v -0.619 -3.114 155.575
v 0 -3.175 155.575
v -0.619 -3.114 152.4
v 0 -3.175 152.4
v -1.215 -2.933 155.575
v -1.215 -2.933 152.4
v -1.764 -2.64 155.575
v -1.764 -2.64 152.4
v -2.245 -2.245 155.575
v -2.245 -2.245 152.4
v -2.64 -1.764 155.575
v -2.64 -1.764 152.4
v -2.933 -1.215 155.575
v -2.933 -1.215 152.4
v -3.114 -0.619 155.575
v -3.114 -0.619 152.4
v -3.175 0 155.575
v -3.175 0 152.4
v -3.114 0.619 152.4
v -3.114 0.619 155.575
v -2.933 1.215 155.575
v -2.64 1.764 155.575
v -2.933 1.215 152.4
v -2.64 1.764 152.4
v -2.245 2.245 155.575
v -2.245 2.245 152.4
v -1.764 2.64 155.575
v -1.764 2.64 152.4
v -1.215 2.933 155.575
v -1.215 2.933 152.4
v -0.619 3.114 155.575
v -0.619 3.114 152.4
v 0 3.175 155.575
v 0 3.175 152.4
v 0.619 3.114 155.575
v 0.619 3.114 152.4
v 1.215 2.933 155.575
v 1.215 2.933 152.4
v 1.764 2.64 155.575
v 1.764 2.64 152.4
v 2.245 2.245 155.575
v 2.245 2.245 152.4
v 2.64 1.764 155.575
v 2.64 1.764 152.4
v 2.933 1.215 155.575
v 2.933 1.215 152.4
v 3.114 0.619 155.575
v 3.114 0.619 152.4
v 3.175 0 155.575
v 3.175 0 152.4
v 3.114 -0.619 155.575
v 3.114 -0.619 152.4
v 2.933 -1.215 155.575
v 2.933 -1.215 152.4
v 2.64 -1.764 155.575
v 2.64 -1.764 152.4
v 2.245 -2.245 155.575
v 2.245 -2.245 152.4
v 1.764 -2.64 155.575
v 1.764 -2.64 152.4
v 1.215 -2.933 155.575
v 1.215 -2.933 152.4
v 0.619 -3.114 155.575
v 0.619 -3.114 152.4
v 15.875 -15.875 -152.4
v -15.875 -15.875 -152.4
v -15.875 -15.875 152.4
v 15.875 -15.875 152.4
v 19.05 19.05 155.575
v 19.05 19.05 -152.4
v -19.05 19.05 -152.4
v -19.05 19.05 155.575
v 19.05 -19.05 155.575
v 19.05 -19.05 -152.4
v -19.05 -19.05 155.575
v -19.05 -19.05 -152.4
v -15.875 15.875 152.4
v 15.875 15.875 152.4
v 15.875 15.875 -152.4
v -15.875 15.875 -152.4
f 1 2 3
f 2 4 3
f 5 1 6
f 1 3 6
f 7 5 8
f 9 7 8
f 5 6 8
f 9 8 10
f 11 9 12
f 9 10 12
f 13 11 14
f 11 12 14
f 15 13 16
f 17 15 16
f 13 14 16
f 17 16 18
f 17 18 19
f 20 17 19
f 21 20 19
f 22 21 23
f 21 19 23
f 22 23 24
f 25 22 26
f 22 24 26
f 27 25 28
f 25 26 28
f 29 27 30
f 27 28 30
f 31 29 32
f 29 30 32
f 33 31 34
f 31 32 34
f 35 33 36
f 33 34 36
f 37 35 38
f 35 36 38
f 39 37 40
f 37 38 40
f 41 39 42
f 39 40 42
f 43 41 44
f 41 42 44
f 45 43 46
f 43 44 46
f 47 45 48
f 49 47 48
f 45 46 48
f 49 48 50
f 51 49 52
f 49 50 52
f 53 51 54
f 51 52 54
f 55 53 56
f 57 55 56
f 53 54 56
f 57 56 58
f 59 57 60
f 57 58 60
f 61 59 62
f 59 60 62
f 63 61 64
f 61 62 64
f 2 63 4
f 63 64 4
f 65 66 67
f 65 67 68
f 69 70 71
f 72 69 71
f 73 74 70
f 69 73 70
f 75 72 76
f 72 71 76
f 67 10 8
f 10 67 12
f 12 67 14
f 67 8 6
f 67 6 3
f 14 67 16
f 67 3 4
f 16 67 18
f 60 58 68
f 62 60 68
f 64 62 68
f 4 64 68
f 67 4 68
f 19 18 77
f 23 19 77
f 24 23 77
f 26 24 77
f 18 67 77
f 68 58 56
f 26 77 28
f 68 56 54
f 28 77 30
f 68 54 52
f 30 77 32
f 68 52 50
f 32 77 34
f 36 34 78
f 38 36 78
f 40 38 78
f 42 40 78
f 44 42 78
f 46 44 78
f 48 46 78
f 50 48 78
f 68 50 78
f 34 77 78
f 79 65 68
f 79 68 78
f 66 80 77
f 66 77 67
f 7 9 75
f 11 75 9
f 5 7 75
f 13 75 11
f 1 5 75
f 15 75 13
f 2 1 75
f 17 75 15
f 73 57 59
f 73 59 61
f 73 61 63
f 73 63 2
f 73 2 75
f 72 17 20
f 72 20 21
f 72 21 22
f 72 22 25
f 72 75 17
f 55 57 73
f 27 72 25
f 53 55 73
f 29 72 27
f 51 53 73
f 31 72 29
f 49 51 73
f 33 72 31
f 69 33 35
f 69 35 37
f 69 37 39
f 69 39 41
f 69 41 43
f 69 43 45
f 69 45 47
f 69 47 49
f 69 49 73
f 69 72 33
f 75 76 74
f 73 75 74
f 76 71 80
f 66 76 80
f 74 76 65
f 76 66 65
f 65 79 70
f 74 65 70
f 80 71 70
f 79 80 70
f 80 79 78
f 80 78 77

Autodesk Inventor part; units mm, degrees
ref_plane "YZ Plane" through (0, 0, 0) normal (1, 0, 0) x (0, 1, 0)
ref_plane "XZ Plane" through (0, 0, 0) normal (0, 1, 0) x (-1, 0, 0)
ref_plane "XY Plane" through (0, 0, 0) normal (0, 0, 1) x (1, 0, 0)
sketch "Sketch1" plane through (0, 0, 0) normal (0, 0, 1) x (1, 0, 0)
  line L0 (-19.05, -19.05) -> (19.05, -19.05)
  line L1 (19.05, -19.05) -> (19.05, 19.05)
  line L2 (19.05, 19.05) -> (-19.05, 19.05)
  line L3 (-19.05, 19.05) -> (-19.05, -19.05)
  line L4 (-19.05, -19.05) -> (19.05, 19.05) construction
  line L5 (19.05, -19.05) -> (-19.05, 19.05) construction
  line L6 (-15.875, -15.875) -> (15.875, -15.875)
  line L7 (15.875, -15.875) -> (15.875, 15.875)
  line L8 (15.875, 15.875) -> (-15.875, 15.875)
  line L9 (-15.875, 15.875) -> (-15.875, -15.875)
  line L10 (-15.875, -15.875) -> (15.875, 15.875) construction
  line L11 (15.875, -15.875) -> (-15.875, 15.875) construction
  point P0 (0, 0)
  dimension "d0" = 38.1
  dimension "d1" = 3.175
extrude "Extrusion1" add sketch "Sketch1" along normal mid plane 304.8
sketch "Sketch3" plane through (0, 0, 152.4) normal (0, 0, 1) x (1, 0, 0)
  line L0 (-19.05, -19.05) -> (19.05, -19.05)
  line L1 (19.05, -19.05) -> (19.05, 19.05)
  line L2 (19.05, 19.05) -> (-19.05, 19.05)
  line L3 (-19.05, 19.05) -> (-19.05, -19.05)
  line L4 (-19.05, -19.05) -> (19.05, 19.05) construction
  line L5 (19.05, -19.05) -> (-19.05, 19.05) construction
  point P0 (0, 0)
extrude "Extrusion2" add sketch "Sketch3" along normal blind 3.175
sketch "Sketch4" plane through (0, 0, 155.575) normal (0, 0, 1) x (1, 0, 0)
  point P0 (0, 0)
  point P1 (0, 0)
hole "Hole1" at (0, 0, 155.575) direction (0, 0, -1) diameter 6.35 end through all
properties part number "LinearExample"
